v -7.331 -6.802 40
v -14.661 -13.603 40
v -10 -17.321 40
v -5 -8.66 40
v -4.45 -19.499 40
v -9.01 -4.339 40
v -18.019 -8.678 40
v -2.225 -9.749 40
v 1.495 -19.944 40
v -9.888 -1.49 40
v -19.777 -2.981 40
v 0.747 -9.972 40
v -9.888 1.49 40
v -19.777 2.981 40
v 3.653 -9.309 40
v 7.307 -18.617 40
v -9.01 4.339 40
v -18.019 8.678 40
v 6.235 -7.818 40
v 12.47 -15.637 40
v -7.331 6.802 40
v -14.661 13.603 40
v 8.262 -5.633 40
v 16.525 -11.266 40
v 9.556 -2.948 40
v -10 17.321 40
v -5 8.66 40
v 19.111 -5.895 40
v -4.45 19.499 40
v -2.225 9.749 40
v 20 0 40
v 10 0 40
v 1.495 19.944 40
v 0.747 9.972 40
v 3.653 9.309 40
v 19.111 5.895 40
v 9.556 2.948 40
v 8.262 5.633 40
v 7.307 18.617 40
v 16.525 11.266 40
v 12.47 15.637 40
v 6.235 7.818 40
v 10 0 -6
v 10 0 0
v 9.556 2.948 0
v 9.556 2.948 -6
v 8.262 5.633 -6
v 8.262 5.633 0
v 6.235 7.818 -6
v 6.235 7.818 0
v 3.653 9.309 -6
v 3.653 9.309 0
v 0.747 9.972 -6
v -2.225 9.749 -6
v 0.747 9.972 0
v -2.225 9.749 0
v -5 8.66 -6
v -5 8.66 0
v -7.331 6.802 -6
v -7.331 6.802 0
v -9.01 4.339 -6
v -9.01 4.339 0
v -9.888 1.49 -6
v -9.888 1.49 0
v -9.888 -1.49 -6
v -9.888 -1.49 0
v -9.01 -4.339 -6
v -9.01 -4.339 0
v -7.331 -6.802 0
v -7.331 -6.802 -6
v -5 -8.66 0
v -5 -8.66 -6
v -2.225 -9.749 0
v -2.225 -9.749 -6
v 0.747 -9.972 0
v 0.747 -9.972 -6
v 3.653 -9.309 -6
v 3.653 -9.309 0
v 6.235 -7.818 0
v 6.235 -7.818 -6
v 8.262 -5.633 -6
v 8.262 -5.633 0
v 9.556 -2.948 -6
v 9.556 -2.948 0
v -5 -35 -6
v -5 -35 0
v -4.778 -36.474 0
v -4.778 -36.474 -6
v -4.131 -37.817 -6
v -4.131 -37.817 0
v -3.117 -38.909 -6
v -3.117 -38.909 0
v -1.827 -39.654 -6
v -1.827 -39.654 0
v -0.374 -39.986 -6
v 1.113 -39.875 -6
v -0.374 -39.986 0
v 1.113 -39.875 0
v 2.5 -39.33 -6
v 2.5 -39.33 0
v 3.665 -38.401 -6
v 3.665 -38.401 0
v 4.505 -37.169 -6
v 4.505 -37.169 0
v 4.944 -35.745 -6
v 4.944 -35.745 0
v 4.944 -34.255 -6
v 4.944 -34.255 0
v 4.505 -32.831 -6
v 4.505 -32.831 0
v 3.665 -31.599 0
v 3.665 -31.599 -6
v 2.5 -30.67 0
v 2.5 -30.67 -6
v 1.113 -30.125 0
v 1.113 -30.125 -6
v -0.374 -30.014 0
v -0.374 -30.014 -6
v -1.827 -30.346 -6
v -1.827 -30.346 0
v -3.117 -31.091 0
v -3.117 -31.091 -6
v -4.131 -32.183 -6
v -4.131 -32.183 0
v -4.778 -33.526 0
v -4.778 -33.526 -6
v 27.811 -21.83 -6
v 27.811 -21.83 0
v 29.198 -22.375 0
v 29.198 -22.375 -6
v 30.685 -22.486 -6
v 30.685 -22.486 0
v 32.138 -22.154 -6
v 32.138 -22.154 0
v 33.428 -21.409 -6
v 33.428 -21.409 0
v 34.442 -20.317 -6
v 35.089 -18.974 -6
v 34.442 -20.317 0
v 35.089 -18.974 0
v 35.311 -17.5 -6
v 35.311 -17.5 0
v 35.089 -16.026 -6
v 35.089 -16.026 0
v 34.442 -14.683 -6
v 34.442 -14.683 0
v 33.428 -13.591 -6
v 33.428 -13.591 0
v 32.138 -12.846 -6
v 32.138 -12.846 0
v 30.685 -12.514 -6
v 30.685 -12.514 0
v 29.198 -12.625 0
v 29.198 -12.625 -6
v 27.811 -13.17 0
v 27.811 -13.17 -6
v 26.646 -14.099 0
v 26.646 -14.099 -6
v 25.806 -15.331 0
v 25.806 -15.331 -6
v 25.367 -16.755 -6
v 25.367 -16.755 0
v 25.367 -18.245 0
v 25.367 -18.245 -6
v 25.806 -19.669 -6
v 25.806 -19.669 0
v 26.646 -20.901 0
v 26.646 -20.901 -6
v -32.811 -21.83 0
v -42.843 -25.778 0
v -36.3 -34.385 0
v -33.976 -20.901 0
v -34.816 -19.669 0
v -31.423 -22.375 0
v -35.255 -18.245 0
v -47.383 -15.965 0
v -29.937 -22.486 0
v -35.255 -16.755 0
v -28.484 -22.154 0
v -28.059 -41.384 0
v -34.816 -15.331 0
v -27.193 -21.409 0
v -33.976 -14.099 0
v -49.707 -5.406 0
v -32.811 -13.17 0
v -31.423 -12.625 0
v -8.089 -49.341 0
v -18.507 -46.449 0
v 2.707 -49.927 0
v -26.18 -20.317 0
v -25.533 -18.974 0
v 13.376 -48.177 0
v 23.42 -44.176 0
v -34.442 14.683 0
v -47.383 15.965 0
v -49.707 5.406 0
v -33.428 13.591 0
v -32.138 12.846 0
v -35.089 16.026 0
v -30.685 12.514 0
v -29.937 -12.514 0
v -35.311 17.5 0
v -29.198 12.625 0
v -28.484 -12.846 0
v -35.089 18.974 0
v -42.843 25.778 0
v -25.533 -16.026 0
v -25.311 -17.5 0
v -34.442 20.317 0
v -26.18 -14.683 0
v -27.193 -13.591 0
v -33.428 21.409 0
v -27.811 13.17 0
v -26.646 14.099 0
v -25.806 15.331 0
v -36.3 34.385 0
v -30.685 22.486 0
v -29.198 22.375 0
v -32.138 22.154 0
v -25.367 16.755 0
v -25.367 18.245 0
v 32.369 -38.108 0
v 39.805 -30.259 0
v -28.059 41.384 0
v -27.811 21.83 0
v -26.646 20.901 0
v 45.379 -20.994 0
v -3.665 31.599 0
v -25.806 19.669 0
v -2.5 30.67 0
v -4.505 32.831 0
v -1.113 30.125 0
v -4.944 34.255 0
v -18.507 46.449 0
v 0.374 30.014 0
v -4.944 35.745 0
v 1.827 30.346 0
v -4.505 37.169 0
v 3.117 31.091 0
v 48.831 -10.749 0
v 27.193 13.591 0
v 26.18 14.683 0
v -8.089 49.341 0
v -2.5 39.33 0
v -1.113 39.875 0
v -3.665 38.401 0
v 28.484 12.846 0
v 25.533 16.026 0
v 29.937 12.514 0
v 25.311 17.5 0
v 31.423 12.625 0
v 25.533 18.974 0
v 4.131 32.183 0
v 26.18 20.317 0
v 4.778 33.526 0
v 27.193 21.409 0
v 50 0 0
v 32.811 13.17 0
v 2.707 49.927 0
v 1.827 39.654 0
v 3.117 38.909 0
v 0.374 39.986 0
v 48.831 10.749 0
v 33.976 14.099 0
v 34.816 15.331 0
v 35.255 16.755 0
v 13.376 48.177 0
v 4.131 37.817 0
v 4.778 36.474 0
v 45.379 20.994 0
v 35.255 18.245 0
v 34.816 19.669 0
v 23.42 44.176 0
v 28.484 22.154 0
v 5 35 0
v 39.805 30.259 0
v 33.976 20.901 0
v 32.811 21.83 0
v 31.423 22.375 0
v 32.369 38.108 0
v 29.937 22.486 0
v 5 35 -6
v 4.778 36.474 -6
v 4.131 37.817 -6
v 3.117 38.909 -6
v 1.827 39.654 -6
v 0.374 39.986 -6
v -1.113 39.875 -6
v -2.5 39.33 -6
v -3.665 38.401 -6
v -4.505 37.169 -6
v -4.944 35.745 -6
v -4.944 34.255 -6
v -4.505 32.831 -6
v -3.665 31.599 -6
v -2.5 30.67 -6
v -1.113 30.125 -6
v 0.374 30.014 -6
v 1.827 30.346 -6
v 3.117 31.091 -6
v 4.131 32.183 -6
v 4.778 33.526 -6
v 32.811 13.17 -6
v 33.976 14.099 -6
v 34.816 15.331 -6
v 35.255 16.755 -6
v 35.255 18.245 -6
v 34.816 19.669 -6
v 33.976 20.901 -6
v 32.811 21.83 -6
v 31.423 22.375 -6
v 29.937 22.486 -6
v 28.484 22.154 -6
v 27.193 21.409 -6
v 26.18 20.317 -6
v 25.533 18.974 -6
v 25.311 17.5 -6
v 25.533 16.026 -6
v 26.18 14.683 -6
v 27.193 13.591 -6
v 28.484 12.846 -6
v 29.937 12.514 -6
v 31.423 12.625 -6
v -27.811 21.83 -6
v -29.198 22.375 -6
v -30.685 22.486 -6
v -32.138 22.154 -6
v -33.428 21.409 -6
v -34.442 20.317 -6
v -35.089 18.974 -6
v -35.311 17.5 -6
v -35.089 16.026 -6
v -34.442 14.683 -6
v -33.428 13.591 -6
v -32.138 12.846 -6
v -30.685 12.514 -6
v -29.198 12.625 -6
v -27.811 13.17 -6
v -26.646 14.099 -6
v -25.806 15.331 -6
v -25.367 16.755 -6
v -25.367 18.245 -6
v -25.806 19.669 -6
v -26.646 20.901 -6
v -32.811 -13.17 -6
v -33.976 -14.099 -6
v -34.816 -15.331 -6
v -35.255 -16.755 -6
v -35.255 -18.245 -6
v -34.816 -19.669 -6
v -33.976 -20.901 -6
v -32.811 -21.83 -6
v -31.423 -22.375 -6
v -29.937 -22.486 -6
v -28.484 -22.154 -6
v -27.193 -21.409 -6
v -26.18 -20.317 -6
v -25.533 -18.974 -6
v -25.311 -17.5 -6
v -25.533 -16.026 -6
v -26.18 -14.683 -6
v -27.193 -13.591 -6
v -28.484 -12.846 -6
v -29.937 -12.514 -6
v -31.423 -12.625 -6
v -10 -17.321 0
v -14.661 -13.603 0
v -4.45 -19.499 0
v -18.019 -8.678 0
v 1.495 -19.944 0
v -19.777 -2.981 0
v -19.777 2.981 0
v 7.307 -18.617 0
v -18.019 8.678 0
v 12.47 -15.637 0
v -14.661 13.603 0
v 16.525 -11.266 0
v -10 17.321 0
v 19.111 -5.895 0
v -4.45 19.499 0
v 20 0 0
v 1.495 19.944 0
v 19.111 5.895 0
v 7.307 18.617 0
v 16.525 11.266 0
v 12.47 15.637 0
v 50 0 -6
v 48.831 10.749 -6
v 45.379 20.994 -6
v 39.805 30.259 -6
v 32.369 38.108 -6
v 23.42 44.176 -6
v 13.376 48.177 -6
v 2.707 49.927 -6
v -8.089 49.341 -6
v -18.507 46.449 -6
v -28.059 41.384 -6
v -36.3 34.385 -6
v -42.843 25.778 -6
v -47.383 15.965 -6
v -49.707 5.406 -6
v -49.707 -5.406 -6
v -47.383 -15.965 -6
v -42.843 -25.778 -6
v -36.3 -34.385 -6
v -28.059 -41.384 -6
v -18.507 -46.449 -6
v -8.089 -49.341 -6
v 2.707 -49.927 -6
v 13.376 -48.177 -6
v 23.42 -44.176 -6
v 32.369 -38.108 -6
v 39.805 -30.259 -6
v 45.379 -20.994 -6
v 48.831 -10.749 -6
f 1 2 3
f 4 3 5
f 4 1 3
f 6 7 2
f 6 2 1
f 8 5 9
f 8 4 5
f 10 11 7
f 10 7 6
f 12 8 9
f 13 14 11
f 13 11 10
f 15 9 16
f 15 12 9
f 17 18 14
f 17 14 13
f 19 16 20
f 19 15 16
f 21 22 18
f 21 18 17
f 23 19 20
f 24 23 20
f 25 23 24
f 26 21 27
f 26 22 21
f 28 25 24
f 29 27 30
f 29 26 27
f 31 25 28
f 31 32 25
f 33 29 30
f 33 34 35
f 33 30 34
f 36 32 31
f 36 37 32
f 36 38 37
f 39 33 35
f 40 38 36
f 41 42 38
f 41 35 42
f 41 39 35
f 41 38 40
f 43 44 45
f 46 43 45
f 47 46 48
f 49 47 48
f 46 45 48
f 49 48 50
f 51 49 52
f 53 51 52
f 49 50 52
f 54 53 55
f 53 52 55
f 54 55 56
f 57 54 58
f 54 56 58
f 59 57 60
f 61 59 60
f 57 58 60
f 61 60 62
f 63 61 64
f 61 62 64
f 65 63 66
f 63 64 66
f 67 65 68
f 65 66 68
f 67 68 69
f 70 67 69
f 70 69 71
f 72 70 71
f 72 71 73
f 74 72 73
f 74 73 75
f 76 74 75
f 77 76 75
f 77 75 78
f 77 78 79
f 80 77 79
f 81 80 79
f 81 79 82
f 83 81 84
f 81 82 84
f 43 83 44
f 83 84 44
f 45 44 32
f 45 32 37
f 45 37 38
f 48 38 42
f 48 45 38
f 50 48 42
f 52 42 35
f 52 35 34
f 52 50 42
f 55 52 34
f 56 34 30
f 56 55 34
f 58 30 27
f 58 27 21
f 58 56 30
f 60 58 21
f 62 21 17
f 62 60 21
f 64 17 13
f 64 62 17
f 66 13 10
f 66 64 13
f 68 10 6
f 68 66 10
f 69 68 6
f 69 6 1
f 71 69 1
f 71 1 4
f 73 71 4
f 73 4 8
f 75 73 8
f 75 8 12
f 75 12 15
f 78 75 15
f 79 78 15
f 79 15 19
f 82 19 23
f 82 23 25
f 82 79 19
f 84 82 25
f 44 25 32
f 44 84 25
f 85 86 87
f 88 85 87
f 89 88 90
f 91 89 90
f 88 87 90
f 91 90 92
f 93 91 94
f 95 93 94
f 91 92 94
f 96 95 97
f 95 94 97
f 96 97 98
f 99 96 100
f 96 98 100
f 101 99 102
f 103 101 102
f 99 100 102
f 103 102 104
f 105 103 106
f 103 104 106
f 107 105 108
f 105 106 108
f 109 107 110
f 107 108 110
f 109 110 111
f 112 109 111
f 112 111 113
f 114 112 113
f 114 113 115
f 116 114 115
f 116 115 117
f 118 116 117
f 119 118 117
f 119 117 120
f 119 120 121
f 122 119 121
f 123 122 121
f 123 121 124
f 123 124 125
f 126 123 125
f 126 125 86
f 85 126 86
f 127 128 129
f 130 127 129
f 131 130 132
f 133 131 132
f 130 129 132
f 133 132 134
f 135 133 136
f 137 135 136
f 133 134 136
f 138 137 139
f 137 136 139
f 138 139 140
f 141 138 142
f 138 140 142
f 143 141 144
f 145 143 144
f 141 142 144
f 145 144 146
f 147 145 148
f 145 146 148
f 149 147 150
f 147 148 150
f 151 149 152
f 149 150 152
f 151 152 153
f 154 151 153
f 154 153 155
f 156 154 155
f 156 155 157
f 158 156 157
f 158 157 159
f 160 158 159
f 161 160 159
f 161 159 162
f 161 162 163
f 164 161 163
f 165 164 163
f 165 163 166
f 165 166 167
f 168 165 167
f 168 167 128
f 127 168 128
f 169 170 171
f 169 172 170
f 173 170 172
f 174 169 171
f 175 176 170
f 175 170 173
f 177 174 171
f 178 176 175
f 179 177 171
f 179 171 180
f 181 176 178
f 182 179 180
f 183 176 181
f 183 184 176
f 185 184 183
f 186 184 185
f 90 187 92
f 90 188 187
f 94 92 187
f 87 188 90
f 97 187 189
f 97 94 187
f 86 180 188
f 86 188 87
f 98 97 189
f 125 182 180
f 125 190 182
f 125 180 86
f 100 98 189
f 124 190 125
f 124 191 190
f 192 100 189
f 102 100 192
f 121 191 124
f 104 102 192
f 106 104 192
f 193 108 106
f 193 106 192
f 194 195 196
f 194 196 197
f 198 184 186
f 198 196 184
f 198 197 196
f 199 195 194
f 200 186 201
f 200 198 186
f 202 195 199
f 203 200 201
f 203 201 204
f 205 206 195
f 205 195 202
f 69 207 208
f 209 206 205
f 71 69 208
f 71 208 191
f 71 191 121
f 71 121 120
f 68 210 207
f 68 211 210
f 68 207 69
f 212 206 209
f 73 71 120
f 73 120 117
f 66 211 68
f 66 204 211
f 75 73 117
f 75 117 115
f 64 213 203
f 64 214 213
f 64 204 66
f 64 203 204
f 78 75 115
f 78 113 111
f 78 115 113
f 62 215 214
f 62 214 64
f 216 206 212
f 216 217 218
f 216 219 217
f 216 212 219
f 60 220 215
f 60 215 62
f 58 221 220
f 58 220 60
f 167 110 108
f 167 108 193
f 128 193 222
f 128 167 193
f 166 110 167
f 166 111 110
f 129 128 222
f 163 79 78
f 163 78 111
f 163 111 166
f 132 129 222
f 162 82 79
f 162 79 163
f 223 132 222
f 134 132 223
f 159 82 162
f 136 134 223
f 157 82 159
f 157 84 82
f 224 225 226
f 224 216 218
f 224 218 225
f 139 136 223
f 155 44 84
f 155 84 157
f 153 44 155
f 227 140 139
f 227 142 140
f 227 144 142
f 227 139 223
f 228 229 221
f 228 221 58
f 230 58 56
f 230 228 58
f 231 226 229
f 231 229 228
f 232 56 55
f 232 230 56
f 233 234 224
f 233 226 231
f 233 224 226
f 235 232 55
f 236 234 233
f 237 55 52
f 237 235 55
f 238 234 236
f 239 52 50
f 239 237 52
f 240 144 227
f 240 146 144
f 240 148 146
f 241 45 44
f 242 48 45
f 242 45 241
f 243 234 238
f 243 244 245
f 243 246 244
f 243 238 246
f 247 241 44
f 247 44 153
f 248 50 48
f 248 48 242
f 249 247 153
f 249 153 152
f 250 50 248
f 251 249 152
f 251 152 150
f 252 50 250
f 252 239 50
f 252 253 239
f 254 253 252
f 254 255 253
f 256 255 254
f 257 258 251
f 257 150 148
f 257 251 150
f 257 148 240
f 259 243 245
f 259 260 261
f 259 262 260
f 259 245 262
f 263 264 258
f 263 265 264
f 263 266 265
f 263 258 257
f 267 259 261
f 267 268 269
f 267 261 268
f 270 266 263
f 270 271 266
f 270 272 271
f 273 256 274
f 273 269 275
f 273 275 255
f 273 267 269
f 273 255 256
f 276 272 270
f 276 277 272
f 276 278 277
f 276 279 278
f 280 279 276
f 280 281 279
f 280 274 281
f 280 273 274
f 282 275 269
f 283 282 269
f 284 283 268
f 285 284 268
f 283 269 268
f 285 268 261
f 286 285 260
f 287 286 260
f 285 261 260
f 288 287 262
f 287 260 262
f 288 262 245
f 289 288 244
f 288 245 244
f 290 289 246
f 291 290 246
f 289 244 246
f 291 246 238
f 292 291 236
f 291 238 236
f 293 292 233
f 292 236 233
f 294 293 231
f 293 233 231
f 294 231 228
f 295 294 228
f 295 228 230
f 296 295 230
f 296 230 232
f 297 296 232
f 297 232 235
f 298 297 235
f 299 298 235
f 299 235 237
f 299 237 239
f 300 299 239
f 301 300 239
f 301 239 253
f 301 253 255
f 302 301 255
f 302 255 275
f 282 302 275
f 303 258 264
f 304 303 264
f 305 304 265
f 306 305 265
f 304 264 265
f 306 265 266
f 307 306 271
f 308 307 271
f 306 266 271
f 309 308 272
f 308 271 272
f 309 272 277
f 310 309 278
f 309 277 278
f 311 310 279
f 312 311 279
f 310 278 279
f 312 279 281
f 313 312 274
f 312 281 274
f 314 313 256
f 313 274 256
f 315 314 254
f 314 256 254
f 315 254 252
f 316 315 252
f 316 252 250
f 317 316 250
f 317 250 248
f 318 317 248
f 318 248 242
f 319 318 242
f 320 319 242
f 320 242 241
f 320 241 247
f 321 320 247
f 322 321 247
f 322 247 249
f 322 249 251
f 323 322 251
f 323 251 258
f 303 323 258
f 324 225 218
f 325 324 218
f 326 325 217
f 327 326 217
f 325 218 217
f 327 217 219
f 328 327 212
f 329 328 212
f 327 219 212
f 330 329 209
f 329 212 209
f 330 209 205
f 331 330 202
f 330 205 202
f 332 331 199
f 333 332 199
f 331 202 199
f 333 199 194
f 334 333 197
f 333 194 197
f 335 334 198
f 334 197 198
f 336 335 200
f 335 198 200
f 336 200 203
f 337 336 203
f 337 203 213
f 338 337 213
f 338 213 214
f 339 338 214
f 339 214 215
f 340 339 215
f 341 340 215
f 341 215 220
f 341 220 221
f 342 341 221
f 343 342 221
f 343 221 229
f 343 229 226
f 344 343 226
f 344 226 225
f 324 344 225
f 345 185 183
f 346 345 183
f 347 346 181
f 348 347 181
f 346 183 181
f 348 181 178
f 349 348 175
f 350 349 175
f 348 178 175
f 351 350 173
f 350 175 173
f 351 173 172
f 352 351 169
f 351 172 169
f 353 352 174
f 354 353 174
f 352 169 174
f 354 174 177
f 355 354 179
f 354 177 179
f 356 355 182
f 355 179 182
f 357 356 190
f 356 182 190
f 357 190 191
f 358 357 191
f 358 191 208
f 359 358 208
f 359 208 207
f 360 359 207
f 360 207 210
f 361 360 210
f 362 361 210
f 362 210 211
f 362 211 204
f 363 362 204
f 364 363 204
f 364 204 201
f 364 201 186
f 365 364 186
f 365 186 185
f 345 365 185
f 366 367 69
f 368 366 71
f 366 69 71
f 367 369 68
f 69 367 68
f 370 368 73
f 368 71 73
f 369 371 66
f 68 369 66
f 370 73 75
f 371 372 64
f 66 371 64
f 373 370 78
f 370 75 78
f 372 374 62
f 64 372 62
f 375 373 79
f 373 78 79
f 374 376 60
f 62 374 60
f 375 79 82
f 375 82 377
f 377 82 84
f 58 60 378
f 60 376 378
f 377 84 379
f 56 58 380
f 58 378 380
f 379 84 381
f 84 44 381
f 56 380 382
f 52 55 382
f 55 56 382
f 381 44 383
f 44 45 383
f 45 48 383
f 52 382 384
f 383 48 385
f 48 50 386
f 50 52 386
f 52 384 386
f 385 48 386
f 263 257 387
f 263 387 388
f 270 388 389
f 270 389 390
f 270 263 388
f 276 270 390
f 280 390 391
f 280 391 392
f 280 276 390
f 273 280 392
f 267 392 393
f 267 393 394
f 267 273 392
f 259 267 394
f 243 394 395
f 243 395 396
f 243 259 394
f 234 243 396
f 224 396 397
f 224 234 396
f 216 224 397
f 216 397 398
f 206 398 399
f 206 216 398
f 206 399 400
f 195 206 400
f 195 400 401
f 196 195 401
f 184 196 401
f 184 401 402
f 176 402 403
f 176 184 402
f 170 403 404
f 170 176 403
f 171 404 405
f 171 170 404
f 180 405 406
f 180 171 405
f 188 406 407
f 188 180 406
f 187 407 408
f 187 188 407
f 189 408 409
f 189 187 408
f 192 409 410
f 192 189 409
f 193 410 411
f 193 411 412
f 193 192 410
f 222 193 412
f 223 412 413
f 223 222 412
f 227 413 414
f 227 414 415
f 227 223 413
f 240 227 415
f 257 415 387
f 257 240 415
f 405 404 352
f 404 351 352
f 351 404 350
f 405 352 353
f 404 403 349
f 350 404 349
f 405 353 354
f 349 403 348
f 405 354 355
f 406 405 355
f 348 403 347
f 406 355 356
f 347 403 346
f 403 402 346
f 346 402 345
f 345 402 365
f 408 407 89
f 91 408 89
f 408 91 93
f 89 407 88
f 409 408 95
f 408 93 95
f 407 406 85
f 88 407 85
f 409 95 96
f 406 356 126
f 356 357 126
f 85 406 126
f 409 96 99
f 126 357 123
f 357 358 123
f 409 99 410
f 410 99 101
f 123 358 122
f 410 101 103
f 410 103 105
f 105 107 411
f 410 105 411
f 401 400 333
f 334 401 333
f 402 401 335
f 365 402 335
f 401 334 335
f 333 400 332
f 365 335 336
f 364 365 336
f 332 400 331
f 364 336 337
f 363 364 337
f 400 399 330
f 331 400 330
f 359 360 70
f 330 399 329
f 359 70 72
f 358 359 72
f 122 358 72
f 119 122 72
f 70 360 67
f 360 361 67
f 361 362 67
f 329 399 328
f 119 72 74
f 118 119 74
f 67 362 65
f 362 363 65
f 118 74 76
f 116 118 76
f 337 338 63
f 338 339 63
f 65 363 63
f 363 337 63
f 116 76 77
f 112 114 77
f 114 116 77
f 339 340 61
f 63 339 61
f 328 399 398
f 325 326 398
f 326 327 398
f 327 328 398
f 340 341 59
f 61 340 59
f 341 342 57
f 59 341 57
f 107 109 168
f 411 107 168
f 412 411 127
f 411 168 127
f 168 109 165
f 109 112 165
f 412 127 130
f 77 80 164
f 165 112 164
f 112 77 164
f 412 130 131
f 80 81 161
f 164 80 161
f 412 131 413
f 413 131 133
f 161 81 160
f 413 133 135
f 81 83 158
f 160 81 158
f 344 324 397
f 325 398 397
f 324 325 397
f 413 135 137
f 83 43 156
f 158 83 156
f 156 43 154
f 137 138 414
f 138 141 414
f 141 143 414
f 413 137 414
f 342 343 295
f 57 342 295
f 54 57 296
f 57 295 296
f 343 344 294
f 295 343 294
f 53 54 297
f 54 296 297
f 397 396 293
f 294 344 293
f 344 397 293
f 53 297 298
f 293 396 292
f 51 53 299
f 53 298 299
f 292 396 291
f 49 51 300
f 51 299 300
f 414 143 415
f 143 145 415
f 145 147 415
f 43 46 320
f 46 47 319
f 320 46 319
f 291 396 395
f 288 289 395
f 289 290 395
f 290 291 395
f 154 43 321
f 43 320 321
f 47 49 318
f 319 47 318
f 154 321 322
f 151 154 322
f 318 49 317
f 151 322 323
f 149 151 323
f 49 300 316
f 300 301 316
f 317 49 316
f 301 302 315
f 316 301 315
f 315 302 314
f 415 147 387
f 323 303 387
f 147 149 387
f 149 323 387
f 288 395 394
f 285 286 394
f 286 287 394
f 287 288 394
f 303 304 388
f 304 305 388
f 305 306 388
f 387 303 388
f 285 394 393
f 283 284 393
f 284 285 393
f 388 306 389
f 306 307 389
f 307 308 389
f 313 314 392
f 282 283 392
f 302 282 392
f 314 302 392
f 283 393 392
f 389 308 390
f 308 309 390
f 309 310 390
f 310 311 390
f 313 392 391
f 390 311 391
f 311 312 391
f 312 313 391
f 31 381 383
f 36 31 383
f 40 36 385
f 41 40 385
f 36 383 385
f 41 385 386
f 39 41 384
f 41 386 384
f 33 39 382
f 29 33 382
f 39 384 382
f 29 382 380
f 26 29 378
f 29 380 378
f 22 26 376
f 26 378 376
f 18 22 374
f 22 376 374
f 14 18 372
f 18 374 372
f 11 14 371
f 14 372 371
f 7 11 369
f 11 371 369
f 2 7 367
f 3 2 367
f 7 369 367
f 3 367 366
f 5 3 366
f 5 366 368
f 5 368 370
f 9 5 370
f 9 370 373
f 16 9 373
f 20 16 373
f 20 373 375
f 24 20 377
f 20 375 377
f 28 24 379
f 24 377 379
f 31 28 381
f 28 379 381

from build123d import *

# Parameters (mm, degrees)
SKETCH1_R           = 50
SKETCH1_R_2         = 10
BOSS_EXTRUDE1_DEPTH = 6
SKETCH1_3_R         = 20
SKETCH1_3_R_2       = 10
BOSS_EXTRUDE2_DEPTH = 40
SKETCH1_4_R         = 5
CUT_EXTRUDE1_DEPTH  = 82.240384046
CIRPATTERN1_COUNT   = 6


with BuildPart() as part:
    # Sketch1 → Boss-Extrude1 (new body)
    with BuildSketch(Plane.XY):
        Circle(SKETCH1_R)
        Circle(SKETCH1_R_2, mode=Mode.SUBTRACT)
    extrude(amount=-BOSS_EXTRUDE1_DEPTH)

    # Sketch1<4> → Cut-Extrude1 (cut, through all)
    with BuildSketch(Plane.XY):
        with Locations((0, 35)):
            Circle(SKETCH1_4_R)
    cut_extrude1 = extrude(amount=-CUT_EXTRUDE1_DEPTH, mode=Mode.SUBTRACT)

    # CirPattern1: Cut-Extrude1 ×6 about axis
    cirpattern1_axis = Axis((0, 0, 40), (0, 0, -1))
    for i in range(1, CIRPATTERN1_COUNT):
        add(cut_extrude1.rotate(cirpattern1_axis, i * 360 / CIRPATTERN1_COUNT), mode=Mode.SUBTRACT)


with BuildPart() as body_2:
    # Sketch1<3> → Boss-Extrude2 (new body)
    with BuildSketch(Plane.XY):
        Circle(SKETCH1_3_R)
        Circle(SKETCH1_3_R_2, mode=Mode.SUBTRACT)
    extrude(amount=BOSS_EXTRUDE2_DEPTH)


solid = Compound([part.part, body_2.part])
